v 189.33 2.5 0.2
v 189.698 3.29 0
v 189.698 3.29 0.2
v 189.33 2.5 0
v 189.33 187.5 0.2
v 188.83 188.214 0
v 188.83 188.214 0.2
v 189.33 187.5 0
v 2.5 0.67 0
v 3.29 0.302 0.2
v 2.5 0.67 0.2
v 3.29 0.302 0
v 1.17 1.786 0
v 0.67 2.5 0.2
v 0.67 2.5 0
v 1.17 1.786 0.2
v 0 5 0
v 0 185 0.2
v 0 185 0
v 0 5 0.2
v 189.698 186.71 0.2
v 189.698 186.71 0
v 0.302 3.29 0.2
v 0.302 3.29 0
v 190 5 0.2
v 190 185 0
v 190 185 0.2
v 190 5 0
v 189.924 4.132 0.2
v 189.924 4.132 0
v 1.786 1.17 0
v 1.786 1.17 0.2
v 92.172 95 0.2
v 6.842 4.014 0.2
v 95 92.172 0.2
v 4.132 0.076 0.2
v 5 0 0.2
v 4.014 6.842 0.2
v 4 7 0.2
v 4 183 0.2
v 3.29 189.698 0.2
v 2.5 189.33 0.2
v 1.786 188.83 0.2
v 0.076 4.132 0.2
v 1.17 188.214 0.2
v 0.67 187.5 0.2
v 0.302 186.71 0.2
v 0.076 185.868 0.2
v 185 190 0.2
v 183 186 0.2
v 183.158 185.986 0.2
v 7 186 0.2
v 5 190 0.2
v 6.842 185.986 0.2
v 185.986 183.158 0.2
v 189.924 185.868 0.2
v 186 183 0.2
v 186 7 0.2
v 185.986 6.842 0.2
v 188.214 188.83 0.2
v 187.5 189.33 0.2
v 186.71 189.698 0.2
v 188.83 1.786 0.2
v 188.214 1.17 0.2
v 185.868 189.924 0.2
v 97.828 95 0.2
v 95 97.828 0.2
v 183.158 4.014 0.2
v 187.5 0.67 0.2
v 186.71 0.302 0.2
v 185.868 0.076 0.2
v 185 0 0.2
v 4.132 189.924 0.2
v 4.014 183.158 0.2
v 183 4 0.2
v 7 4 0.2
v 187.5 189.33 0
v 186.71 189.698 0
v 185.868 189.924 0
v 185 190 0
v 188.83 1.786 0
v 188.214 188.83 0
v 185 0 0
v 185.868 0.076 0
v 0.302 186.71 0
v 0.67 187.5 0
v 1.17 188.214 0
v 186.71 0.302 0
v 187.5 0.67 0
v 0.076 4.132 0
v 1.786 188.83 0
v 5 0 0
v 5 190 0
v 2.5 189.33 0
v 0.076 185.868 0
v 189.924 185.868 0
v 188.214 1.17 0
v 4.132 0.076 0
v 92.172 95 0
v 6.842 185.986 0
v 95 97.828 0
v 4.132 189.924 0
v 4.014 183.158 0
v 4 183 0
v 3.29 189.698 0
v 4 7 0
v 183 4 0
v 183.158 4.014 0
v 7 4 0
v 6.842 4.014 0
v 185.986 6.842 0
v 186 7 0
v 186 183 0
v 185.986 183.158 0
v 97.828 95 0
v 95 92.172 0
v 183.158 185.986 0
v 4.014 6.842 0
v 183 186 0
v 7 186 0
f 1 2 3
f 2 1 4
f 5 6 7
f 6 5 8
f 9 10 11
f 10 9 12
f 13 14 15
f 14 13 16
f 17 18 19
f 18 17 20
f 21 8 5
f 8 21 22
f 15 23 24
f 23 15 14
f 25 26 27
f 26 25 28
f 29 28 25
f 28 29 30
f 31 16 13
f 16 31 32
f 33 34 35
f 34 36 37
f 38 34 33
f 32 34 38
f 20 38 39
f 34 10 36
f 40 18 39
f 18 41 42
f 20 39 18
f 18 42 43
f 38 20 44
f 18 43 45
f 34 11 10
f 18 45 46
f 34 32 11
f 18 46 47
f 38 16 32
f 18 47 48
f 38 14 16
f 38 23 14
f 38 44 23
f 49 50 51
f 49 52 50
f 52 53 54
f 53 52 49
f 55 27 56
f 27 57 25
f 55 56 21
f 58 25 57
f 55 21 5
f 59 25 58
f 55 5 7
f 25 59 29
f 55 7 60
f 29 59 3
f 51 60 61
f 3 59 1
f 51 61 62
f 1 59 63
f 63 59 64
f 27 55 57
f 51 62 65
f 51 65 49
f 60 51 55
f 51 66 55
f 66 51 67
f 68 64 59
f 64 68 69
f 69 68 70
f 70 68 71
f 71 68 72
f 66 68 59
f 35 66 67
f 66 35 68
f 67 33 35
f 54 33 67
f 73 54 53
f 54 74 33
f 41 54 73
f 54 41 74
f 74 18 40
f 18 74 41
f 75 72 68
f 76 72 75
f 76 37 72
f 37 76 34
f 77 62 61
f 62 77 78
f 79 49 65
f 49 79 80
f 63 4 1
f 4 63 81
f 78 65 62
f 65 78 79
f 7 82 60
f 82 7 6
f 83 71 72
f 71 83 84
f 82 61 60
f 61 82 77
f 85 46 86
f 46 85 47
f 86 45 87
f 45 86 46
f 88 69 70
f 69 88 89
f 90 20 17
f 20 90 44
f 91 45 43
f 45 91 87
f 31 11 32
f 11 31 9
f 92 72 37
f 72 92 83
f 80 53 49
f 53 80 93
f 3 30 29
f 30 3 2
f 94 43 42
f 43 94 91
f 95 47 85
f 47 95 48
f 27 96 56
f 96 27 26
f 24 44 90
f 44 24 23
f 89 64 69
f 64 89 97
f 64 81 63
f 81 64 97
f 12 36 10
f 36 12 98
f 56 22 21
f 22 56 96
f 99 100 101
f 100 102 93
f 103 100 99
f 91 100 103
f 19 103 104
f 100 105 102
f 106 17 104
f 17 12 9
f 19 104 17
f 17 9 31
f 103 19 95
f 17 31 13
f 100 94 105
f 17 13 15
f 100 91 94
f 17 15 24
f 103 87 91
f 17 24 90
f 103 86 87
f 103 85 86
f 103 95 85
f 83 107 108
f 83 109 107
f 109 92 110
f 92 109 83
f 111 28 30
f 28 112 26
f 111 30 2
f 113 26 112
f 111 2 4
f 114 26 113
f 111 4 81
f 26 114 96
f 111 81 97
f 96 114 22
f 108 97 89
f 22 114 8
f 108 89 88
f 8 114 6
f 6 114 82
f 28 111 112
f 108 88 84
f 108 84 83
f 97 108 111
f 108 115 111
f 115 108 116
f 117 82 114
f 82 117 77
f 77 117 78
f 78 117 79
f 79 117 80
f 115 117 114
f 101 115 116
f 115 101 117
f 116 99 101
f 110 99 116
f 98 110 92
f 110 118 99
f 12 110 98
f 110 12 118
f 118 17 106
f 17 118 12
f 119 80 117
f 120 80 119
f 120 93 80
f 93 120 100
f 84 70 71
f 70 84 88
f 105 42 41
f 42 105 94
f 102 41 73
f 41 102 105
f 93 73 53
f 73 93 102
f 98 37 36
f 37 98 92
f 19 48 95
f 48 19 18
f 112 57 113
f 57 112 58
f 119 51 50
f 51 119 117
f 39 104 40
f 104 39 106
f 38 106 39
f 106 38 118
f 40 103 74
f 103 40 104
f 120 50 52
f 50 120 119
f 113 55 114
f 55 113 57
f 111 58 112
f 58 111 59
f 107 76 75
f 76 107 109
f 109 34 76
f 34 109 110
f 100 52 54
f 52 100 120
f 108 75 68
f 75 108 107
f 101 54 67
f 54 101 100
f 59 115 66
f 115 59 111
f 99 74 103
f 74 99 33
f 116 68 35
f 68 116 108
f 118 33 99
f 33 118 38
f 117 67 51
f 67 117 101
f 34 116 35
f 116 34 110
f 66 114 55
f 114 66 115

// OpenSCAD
$fn = 36;
SIZE_X = 190;
SIZE_Y = 190;
SIZE_Z = 0.2;

ROUNDING = 10;

OUTER_WALL_THICKNESS = 4;
INNER_WALL_THICKNESS = 4;


module roundedBase(OFFSET, X, Y, Z) {
    RADIUS = OFFSET / 2;
    X1 = RADIUS;
    X2 = X - OFFSET;
    Y1 = RADIUS;
    Y2 = Y - OFFSET;

    resize([X, Y, Z]) {
        translate([X1, Y1, 0]) {
            minkowski() {
                cube([X2, Y2, Z]);
                cylinder(r = RADIUS, h = Z);
            }
        }
    }
}

module cross(KOEF = 1) {
    CROSS_SIZE_X = sqrt( pow(SIZE_X, 2) + pow(SIZE_Y, 2) );
    CROSS_SIZE_Y = INNER_WALL_THICKNESS;
    CROSS_SIZE_Z = SIZE_Z;

    ANGLE = asin( SIZE_Y / CROSS_SIZE_X );

    translate([SIZE_X / 2, SIZE_Y / 2, 0])
        rotate([0, 0, ANGLE * KOEF])
            translate([0, 0, CROSS_SIZE_Z/2])
                resize([CROSS_SIZE_X - OUTER_WALL_THICKNESS * 1.5, CROSS_SIZE_Y, CROSS_SIZE_Z])
                    cube([CROSS_SIZE_X, CROSS_SIZE_Y, CROSS_SIZE_Z], center = true);
}

union() {
    cross(-1);
    cross();
    difference() {
        roundedBase(ROUNDING, SIZE_X, SIZE_Y, SIZE_Z);
        translate([OUTER_WALL_THICKNESS, OUTER_WALL_THICKNESS, 0])
            roundedBase(ROUNDING - OUTER_WALL_THICKNESS, SIZE_X - OUTER_WALL_THICKNESS * 2, SIZE_Y - OUTER_WALL_THICKNESS * 2, SIZE_Z);
    }
}
